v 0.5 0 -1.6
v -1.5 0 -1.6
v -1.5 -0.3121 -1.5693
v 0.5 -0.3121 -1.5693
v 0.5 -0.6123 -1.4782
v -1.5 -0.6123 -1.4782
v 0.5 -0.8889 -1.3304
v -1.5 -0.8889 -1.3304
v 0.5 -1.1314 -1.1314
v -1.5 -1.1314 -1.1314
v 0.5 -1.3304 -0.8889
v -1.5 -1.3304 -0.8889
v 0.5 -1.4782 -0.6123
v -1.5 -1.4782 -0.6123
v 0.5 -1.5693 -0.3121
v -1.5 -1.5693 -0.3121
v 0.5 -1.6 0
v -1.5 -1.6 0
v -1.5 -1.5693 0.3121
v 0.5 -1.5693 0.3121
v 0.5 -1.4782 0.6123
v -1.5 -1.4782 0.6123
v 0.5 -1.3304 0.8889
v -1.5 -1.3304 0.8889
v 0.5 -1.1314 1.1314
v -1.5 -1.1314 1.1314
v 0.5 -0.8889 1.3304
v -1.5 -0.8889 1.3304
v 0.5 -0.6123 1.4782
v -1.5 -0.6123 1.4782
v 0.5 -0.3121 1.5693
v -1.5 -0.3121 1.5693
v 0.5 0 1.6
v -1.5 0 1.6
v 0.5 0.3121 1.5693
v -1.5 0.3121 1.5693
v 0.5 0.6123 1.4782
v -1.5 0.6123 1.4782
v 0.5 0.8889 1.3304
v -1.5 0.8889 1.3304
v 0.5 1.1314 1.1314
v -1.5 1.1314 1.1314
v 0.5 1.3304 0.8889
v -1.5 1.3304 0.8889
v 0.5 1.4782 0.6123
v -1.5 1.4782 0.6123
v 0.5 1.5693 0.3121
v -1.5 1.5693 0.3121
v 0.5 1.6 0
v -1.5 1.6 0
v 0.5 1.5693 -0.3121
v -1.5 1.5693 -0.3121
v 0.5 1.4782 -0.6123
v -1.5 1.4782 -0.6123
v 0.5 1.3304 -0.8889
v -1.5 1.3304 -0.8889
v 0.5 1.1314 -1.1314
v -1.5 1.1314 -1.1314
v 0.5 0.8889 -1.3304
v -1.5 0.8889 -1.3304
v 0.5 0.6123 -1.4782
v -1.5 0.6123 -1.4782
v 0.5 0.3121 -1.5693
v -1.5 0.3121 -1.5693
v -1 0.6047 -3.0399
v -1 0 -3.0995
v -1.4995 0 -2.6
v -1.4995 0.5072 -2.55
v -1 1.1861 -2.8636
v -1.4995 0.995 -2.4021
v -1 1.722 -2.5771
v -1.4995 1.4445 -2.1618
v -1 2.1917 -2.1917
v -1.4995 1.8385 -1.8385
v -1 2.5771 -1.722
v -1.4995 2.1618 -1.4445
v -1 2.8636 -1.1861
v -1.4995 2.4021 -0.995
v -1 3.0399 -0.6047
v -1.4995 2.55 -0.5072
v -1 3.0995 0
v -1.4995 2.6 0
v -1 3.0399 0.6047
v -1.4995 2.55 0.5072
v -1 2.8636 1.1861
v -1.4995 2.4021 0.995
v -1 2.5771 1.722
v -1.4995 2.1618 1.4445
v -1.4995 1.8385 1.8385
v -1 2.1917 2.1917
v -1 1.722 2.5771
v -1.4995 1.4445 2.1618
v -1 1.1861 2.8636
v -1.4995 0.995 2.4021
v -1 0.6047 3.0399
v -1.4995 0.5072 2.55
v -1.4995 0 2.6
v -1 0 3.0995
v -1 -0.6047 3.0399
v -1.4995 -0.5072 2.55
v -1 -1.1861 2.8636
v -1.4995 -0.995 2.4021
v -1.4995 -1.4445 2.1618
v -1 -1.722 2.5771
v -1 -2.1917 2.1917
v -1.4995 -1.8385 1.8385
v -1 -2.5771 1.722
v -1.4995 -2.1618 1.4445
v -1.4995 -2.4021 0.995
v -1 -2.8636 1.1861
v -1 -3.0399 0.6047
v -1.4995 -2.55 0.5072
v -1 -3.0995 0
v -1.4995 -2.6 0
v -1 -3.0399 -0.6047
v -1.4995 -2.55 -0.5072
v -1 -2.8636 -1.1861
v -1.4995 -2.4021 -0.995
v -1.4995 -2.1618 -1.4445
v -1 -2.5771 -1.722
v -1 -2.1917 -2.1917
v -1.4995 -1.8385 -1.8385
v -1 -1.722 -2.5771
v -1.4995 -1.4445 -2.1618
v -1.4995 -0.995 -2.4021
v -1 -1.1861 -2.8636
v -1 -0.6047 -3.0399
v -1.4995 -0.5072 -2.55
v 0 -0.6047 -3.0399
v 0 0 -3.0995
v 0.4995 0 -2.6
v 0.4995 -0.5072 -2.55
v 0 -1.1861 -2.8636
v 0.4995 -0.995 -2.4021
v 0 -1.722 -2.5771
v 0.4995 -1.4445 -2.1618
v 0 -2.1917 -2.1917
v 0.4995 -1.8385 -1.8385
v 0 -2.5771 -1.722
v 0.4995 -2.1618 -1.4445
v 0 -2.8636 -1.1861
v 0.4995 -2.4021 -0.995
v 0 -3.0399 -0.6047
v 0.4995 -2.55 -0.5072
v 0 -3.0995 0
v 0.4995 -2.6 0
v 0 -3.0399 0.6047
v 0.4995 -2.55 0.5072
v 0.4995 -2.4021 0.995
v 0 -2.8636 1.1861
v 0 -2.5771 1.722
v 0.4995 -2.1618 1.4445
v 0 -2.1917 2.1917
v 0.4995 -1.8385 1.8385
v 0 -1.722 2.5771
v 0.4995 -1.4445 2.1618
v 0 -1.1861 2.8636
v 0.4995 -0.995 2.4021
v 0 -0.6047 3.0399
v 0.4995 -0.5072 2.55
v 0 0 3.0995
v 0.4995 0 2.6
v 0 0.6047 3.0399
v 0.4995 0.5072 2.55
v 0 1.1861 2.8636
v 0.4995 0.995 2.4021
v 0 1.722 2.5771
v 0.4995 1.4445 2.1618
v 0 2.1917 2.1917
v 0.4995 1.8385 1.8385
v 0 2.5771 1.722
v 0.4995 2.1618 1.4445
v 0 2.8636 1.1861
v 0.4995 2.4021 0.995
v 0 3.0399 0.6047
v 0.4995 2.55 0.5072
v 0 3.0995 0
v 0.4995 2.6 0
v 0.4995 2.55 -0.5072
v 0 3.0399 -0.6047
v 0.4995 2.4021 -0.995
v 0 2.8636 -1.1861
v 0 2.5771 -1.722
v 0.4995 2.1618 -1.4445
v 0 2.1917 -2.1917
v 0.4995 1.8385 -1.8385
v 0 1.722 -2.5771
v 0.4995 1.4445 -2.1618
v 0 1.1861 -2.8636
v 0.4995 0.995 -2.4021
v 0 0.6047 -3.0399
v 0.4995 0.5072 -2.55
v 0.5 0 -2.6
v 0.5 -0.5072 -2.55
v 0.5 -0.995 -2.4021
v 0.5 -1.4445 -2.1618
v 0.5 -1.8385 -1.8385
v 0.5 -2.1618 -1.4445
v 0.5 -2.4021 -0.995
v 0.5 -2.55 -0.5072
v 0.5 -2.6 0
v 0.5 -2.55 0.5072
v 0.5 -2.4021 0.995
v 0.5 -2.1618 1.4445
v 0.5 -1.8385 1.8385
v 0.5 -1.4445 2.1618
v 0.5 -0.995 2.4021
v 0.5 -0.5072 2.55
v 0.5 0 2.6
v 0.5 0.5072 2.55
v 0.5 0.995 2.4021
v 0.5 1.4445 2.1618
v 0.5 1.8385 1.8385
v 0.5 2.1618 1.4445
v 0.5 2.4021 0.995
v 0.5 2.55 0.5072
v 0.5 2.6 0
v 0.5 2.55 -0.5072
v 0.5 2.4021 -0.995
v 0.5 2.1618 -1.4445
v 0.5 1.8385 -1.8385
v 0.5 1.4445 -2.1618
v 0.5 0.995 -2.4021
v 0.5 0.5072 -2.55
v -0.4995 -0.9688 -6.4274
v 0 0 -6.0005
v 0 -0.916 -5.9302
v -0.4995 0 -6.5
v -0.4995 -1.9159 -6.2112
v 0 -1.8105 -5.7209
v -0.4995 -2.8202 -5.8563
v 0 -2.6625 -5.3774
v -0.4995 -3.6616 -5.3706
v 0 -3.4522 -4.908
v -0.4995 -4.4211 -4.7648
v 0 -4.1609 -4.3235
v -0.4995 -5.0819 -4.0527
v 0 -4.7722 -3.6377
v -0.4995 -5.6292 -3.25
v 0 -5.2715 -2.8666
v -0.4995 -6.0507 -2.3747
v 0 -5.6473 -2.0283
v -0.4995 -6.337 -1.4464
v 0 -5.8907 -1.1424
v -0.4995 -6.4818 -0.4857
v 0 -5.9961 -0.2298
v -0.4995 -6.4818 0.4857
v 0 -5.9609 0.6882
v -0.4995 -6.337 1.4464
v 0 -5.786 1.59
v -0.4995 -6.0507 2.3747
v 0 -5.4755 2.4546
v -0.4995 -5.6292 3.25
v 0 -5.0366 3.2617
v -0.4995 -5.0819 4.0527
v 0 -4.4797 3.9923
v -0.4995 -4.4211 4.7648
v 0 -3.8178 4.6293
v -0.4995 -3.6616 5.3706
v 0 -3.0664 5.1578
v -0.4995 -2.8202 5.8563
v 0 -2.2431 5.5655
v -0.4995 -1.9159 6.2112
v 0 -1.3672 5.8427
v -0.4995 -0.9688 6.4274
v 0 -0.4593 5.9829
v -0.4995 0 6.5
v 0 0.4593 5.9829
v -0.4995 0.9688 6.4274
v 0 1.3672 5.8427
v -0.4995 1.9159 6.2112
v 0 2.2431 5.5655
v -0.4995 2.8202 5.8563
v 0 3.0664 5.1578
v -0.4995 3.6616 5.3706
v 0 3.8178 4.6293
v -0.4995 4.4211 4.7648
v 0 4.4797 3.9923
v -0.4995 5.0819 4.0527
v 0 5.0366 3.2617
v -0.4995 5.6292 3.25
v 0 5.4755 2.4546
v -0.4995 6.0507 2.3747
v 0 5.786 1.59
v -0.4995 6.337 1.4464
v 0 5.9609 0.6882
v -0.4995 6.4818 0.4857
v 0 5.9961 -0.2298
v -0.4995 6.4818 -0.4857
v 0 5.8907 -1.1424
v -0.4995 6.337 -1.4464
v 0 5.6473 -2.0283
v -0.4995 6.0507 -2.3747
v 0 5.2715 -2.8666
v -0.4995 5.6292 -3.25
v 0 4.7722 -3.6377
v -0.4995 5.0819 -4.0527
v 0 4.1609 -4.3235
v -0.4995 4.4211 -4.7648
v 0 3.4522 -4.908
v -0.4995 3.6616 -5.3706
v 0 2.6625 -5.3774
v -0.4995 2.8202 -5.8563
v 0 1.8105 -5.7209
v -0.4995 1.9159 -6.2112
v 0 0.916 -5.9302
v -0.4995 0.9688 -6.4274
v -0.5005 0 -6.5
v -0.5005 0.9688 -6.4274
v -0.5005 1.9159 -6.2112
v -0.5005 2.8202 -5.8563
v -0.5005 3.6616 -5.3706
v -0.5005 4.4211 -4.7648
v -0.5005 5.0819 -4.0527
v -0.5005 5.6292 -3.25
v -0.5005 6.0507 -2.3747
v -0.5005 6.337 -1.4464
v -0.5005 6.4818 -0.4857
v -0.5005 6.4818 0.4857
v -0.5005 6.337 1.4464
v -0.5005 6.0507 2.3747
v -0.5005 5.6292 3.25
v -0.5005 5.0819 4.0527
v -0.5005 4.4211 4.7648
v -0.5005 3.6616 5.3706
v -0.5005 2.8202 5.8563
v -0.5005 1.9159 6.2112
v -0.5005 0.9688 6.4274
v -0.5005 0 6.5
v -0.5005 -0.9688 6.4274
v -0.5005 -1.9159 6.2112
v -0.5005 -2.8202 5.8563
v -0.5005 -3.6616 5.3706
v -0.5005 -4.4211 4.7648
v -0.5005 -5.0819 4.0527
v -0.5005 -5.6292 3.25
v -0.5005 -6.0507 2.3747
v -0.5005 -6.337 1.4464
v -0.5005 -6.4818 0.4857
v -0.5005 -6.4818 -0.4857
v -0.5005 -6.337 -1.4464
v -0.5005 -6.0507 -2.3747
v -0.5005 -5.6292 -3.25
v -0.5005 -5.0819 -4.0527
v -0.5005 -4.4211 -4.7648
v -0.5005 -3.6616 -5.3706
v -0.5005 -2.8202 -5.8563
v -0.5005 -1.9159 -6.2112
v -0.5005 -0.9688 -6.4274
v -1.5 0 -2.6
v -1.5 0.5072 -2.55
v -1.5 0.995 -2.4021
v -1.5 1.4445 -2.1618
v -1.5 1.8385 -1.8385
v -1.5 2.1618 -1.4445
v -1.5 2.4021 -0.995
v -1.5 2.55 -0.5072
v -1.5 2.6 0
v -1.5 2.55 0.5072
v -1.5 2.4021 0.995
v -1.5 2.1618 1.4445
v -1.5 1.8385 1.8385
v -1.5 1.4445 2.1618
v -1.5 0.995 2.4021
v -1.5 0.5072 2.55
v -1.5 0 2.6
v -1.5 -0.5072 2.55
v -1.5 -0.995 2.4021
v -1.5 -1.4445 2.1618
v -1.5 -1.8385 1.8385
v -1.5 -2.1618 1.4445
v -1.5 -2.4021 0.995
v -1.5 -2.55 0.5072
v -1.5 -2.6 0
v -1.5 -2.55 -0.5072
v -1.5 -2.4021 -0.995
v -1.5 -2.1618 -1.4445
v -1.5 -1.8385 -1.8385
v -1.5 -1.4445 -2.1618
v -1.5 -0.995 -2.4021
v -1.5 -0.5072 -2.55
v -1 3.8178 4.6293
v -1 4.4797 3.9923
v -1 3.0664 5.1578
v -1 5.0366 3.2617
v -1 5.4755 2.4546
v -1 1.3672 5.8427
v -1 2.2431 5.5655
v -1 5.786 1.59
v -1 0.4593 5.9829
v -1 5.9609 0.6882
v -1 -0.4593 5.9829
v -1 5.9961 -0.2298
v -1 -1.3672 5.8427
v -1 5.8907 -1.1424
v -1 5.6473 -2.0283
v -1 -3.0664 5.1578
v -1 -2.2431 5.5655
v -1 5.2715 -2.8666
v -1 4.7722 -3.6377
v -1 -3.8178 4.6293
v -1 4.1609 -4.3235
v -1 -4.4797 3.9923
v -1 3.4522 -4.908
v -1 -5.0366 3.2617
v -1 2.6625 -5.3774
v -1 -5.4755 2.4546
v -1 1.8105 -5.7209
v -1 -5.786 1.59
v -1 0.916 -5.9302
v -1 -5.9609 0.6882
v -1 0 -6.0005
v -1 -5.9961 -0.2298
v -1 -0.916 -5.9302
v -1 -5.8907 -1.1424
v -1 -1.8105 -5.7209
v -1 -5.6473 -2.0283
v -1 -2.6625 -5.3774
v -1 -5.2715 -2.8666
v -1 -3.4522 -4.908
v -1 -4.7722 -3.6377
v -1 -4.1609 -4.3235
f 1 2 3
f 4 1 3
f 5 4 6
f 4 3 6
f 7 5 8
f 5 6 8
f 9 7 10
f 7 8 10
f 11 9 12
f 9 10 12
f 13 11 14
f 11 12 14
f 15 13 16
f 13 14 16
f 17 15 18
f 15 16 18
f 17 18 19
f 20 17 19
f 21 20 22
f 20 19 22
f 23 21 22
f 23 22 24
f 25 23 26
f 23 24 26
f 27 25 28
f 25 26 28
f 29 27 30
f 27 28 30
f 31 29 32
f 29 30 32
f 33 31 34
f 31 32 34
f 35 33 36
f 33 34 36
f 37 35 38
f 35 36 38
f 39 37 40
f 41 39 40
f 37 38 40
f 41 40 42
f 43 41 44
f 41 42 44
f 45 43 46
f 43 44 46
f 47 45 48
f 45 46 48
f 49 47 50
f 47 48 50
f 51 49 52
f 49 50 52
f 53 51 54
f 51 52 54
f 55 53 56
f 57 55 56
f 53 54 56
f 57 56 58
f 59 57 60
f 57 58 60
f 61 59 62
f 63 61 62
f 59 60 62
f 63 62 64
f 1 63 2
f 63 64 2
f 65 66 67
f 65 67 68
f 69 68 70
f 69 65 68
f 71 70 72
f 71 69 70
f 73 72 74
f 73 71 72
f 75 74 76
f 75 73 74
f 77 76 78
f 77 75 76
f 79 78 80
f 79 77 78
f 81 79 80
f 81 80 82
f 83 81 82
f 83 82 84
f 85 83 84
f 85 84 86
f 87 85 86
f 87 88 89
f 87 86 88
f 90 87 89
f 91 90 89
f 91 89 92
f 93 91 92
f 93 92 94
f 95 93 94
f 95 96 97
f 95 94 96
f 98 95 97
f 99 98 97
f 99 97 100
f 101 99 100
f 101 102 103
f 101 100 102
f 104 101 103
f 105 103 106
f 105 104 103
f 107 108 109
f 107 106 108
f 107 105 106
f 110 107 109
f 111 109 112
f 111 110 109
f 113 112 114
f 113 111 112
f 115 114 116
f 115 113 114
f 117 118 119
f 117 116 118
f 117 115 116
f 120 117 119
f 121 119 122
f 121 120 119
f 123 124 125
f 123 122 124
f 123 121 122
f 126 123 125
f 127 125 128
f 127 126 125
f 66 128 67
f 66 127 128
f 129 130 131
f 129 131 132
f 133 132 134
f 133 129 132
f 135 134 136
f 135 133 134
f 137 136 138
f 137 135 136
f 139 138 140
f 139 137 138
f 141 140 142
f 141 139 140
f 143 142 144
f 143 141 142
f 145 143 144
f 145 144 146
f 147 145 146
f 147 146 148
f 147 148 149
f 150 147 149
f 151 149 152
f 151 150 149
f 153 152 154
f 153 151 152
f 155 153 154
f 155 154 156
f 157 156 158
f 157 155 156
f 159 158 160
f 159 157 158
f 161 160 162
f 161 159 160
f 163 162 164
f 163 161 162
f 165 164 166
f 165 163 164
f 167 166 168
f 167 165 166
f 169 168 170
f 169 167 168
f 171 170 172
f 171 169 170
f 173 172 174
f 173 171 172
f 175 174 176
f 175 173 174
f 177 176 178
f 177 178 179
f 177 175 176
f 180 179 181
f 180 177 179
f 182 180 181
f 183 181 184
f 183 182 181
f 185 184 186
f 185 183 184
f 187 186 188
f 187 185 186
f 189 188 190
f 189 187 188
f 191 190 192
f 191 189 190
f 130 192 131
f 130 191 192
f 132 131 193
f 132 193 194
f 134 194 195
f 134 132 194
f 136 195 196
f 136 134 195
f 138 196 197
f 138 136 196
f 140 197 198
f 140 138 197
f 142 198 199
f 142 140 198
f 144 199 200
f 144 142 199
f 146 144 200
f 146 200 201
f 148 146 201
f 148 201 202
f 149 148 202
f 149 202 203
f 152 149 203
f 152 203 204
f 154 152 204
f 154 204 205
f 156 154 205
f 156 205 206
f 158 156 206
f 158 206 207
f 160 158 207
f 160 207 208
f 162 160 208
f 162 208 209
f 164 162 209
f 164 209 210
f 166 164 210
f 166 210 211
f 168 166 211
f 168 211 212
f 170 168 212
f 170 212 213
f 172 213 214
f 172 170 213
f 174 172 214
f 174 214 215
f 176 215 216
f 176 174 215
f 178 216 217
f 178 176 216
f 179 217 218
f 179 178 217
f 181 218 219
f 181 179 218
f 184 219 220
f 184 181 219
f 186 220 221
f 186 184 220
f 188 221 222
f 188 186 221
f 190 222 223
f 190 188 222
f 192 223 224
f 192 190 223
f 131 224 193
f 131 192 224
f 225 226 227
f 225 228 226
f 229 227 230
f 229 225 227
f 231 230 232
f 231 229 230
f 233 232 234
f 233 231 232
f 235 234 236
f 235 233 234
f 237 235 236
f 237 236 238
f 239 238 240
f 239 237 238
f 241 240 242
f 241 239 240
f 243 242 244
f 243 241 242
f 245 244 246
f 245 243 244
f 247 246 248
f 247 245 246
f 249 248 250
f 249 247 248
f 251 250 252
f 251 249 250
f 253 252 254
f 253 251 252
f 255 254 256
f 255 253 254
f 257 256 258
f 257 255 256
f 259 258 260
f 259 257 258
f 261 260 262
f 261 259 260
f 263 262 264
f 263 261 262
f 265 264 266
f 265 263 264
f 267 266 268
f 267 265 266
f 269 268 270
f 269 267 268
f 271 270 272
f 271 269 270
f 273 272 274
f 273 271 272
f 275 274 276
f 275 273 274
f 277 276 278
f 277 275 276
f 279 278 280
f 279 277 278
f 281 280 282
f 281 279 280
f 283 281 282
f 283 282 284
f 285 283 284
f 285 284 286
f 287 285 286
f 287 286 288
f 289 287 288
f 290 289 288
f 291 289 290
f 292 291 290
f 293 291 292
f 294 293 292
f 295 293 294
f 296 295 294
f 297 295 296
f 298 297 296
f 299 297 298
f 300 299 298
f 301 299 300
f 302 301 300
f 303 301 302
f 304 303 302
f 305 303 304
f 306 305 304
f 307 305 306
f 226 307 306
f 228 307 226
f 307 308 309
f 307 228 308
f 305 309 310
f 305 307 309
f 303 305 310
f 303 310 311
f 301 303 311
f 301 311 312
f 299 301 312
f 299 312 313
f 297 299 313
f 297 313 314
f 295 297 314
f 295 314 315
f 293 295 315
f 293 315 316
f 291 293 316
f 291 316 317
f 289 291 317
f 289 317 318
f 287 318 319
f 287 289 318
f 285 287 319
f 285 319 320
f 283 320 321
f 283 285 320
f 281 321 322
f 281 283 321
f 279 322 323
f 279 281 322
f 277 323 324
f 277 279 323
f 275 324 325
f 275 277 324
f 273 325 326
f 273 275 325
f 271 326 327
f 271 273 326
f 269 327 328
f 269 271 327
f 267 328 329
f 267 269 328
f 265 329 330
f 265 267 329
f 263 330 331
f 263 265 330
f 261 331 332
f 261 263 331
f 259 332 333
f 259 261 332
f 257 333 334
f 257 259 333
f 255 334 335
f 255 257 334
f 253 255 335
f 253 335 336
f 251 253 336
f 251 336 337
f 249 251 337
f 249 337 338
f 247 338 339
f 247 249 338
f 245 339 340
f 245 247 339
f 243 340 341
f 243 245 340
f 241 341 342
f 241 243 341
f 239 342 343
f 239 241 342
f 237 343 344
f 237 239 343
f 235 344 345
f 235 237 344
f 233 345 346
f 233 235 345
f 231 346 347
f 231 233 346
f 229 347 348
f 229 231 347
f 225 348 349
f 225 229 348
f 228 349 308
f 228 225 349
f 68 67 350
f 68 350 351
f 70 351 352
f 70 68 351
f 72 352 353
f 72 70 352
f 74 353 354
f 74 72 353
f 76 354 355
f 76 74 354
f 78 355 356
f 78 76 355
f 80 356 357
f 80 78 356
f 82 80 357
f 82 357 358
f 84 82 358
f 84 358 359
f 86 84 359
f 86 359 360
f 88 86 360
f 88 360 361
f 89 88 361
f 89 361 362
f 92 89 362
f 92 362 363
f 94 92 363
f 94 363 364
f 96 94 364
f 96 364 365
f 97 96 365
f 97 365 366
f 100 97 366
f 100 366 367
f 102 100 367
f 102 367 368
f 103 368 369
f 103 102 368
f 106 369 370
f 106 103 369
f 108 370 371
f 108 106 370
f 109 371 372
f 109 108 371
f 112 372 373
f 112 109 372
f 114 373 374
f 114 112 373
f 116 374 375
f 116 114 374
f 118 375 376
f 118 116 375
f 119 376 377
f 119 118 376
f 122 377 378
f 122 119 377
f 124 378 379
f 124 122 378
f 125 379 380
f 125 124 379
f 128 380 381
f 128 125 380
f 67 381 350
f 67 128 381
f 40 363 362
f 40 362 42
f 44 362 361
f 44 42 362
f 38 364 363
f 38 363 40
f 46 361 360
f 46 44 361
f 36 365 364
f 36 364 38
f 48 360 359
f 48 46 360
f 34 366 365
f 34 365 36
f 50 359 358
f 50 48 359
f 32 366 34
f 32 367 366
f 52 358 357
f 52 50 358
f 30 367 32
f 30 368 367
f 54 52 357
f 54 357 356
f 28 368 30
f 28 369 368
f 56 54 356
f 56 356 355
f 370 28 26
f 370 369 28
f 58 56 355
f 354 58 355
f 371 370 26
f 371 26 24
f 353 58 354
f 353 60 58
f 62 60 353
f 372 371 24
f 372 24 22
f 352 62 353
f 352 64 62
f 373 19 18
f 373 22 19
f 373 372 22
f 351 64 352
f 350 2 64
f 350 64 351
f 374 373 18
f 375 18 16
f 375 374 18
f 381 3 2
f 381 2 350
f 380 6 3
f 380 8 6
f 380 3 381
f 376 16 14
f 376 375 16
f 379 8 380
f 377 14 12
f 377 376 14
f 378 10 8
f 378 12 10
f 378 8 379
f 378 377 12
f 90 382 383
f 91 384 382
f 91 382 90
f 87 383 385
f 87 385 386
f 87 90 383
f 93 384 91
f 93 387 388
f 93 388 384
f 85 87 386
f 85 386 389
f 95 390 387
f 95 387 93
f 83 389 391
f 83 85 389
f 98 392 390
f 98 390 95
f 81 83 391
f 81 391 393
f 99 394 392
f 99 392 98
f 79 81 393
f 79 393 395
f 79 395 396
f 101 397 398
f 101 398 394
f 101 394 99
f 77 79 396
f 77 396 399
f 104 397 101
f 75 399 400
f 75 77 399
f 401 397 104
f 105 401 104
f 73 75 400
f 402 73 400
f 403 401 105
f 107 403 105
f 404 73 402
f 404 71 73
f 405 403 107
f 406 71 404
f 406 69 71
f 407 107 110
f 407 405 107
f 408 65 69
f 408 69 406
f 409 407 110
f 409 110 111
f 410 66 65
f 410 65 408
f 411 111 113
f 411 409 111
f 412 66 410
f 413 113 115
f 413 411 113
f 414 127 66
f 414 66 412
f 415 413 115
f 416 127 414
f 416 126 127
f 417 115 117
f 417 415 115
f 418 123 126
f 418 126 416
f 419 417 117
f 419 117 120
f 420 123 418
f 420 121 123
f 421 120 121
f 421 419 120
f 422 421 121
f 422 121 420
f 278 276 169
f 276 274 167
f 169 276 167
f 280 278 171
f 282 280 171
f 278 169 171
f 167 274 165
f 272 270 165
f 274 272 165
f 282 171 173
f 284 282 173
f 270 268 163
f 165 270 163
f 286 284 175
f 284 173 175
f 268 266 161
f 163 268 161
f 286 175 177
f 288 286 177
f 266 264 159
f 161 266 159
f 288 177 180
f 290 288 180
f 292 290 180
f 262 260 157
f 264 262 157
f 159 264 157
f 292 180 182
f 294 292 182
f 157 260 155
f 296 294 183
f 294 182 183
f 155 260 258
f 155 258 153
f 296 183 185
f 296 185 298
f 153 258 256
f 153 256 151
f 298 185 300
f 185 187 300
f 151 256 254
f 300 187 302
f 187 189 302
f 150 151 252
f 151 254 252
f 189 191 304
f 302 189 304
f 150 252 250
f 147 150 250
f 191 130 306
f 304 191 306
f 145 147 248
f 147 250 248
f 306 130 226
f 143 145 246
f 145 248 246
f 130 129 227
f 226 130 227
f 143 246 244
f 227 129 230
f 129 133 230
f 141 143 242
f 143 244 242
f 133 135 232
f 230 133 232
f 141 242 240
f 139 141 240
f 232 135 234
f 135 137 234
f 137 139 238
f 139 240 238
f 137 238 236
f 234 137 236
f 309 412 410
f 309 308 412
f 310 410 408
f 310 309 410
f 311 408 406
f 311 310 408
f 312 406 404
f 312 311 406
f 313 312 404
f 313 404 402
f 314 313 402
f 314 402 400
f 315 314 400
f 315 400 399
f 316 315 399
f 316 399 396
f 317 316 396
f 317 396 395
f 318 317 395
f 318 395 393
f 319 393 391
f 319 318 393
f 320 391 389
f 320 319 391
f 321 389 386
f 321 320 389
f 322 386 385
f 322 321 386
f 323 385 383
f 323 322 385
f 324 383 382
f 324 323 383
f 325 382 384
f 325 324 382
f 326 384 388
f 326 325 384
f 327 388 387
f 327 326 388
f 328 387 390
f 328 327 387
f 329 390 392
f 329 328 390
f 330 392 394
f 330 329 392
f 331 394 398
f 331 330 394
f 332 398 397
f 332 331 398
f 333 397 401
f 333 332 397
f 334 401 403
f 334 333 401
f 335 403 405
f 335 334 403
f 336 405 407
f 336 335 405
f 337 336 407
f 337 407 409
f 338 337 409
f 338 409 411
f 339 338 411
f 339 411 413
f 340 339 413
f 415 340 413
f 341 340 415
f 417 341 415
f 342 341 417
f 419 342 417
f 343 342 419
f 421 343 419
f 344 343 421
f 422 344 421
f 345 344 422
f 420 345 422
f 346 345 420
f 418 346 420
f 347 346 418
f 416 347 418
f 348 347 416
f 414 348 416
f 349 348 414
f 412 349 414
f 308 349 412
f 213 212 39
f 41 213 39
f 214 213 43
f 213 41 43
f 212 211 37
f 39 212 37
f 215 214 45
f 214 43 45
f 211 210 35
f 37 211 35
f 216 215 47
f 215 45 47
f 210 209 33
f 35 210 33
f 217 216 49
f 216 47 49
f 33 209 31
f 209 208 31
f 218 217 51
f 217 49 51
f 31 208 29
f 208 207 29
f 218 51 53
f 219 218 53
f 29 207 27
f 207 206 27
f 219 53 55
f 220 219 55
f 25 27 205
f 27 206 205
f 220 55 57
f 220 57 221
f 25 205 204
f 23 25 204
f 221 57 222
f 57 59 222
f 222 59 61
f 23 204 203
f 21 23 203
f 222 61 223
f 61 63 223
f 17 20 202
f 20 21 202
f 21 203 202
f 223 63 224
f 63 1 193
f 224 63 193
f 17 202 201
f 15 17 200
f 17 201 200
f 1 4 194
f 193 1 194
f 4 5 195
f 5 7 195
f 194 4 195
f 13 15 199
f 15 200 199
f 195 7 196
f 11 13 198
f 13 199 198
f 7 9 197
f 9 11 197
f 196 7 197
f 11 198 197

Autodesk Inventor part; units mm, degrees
ref_plane "YZ Plane" through (0, 0, 0) normal (1, 0, 0) x (0, 1, 0)
ref_plane "XZ Plane" through (0, 0, 0) normal (0, 1, 0) x (-1, 0, 0)
ref_plane "XY Plane" through (0, 0, 0) normal (0, 0, 1) x (1, 0, 0)
sketch "Sketch1" plane through (0, 0, 0) normal (0, 1, 0) x (-1, 0, 0)
  line L0 (0, 0) -> (1, 0)
  line L1 (1, 0) -> (1, -6.5)
  line L2 (1, -6.5) -> (0, -6.5)
  line L3 (0, -6.5) -> (0, 0)
  line L4 (1, 0) -> (0, 0)
  line L5 (0, 0) -> (0, -1.6)
  line L6 (0, -1.6) -> (1, -1.6)
  line L7 (1, -1.6) -> (1, 0)
  line L8 (1, -1.6) -> (1.5, -1.6)
  line L9 (1.5, -1.6) -> (1.5, -2.6)
  line L10 (1.5, -2.6) -> (1, -2.6)
  line L11 (1, -2.6) -> (1, -1.6)
  line L12 (0, -1.6) -> (-0.5, -1.6)
  line L13 (-0.5, -1.6) -> (-0.5, -2.6)
  line L14 (-0.5, -2.6) -> (0, -2.6)
  line L15 (0, -2.6) -> (0, -1.6)
  dimension "d0" = 1
  dimension "d1" = 6.5
  dimension "d2" = 1.6
  dimension "d3" = 0.5
  dimension "d4" = 1
  dimension "d5" = 0.5
  dimension "d6" = 1
revolve "Revolution1" add sketch "Sketch1" angle 360 about axis through (0, 0, 0) along (-1, 0, 0) contours L6 L1 L2 L3 | L3 L14 L13 L12 | L8 L9 L10 L1
chamfer "Chamfer1" distance 0.5 angle 45 4 edges at (-1, 0, 2.6) (0, 0, 2.6) (0, 0, 6.5) (-1, 0, 6.5)
properties part number "idler_spacer"
